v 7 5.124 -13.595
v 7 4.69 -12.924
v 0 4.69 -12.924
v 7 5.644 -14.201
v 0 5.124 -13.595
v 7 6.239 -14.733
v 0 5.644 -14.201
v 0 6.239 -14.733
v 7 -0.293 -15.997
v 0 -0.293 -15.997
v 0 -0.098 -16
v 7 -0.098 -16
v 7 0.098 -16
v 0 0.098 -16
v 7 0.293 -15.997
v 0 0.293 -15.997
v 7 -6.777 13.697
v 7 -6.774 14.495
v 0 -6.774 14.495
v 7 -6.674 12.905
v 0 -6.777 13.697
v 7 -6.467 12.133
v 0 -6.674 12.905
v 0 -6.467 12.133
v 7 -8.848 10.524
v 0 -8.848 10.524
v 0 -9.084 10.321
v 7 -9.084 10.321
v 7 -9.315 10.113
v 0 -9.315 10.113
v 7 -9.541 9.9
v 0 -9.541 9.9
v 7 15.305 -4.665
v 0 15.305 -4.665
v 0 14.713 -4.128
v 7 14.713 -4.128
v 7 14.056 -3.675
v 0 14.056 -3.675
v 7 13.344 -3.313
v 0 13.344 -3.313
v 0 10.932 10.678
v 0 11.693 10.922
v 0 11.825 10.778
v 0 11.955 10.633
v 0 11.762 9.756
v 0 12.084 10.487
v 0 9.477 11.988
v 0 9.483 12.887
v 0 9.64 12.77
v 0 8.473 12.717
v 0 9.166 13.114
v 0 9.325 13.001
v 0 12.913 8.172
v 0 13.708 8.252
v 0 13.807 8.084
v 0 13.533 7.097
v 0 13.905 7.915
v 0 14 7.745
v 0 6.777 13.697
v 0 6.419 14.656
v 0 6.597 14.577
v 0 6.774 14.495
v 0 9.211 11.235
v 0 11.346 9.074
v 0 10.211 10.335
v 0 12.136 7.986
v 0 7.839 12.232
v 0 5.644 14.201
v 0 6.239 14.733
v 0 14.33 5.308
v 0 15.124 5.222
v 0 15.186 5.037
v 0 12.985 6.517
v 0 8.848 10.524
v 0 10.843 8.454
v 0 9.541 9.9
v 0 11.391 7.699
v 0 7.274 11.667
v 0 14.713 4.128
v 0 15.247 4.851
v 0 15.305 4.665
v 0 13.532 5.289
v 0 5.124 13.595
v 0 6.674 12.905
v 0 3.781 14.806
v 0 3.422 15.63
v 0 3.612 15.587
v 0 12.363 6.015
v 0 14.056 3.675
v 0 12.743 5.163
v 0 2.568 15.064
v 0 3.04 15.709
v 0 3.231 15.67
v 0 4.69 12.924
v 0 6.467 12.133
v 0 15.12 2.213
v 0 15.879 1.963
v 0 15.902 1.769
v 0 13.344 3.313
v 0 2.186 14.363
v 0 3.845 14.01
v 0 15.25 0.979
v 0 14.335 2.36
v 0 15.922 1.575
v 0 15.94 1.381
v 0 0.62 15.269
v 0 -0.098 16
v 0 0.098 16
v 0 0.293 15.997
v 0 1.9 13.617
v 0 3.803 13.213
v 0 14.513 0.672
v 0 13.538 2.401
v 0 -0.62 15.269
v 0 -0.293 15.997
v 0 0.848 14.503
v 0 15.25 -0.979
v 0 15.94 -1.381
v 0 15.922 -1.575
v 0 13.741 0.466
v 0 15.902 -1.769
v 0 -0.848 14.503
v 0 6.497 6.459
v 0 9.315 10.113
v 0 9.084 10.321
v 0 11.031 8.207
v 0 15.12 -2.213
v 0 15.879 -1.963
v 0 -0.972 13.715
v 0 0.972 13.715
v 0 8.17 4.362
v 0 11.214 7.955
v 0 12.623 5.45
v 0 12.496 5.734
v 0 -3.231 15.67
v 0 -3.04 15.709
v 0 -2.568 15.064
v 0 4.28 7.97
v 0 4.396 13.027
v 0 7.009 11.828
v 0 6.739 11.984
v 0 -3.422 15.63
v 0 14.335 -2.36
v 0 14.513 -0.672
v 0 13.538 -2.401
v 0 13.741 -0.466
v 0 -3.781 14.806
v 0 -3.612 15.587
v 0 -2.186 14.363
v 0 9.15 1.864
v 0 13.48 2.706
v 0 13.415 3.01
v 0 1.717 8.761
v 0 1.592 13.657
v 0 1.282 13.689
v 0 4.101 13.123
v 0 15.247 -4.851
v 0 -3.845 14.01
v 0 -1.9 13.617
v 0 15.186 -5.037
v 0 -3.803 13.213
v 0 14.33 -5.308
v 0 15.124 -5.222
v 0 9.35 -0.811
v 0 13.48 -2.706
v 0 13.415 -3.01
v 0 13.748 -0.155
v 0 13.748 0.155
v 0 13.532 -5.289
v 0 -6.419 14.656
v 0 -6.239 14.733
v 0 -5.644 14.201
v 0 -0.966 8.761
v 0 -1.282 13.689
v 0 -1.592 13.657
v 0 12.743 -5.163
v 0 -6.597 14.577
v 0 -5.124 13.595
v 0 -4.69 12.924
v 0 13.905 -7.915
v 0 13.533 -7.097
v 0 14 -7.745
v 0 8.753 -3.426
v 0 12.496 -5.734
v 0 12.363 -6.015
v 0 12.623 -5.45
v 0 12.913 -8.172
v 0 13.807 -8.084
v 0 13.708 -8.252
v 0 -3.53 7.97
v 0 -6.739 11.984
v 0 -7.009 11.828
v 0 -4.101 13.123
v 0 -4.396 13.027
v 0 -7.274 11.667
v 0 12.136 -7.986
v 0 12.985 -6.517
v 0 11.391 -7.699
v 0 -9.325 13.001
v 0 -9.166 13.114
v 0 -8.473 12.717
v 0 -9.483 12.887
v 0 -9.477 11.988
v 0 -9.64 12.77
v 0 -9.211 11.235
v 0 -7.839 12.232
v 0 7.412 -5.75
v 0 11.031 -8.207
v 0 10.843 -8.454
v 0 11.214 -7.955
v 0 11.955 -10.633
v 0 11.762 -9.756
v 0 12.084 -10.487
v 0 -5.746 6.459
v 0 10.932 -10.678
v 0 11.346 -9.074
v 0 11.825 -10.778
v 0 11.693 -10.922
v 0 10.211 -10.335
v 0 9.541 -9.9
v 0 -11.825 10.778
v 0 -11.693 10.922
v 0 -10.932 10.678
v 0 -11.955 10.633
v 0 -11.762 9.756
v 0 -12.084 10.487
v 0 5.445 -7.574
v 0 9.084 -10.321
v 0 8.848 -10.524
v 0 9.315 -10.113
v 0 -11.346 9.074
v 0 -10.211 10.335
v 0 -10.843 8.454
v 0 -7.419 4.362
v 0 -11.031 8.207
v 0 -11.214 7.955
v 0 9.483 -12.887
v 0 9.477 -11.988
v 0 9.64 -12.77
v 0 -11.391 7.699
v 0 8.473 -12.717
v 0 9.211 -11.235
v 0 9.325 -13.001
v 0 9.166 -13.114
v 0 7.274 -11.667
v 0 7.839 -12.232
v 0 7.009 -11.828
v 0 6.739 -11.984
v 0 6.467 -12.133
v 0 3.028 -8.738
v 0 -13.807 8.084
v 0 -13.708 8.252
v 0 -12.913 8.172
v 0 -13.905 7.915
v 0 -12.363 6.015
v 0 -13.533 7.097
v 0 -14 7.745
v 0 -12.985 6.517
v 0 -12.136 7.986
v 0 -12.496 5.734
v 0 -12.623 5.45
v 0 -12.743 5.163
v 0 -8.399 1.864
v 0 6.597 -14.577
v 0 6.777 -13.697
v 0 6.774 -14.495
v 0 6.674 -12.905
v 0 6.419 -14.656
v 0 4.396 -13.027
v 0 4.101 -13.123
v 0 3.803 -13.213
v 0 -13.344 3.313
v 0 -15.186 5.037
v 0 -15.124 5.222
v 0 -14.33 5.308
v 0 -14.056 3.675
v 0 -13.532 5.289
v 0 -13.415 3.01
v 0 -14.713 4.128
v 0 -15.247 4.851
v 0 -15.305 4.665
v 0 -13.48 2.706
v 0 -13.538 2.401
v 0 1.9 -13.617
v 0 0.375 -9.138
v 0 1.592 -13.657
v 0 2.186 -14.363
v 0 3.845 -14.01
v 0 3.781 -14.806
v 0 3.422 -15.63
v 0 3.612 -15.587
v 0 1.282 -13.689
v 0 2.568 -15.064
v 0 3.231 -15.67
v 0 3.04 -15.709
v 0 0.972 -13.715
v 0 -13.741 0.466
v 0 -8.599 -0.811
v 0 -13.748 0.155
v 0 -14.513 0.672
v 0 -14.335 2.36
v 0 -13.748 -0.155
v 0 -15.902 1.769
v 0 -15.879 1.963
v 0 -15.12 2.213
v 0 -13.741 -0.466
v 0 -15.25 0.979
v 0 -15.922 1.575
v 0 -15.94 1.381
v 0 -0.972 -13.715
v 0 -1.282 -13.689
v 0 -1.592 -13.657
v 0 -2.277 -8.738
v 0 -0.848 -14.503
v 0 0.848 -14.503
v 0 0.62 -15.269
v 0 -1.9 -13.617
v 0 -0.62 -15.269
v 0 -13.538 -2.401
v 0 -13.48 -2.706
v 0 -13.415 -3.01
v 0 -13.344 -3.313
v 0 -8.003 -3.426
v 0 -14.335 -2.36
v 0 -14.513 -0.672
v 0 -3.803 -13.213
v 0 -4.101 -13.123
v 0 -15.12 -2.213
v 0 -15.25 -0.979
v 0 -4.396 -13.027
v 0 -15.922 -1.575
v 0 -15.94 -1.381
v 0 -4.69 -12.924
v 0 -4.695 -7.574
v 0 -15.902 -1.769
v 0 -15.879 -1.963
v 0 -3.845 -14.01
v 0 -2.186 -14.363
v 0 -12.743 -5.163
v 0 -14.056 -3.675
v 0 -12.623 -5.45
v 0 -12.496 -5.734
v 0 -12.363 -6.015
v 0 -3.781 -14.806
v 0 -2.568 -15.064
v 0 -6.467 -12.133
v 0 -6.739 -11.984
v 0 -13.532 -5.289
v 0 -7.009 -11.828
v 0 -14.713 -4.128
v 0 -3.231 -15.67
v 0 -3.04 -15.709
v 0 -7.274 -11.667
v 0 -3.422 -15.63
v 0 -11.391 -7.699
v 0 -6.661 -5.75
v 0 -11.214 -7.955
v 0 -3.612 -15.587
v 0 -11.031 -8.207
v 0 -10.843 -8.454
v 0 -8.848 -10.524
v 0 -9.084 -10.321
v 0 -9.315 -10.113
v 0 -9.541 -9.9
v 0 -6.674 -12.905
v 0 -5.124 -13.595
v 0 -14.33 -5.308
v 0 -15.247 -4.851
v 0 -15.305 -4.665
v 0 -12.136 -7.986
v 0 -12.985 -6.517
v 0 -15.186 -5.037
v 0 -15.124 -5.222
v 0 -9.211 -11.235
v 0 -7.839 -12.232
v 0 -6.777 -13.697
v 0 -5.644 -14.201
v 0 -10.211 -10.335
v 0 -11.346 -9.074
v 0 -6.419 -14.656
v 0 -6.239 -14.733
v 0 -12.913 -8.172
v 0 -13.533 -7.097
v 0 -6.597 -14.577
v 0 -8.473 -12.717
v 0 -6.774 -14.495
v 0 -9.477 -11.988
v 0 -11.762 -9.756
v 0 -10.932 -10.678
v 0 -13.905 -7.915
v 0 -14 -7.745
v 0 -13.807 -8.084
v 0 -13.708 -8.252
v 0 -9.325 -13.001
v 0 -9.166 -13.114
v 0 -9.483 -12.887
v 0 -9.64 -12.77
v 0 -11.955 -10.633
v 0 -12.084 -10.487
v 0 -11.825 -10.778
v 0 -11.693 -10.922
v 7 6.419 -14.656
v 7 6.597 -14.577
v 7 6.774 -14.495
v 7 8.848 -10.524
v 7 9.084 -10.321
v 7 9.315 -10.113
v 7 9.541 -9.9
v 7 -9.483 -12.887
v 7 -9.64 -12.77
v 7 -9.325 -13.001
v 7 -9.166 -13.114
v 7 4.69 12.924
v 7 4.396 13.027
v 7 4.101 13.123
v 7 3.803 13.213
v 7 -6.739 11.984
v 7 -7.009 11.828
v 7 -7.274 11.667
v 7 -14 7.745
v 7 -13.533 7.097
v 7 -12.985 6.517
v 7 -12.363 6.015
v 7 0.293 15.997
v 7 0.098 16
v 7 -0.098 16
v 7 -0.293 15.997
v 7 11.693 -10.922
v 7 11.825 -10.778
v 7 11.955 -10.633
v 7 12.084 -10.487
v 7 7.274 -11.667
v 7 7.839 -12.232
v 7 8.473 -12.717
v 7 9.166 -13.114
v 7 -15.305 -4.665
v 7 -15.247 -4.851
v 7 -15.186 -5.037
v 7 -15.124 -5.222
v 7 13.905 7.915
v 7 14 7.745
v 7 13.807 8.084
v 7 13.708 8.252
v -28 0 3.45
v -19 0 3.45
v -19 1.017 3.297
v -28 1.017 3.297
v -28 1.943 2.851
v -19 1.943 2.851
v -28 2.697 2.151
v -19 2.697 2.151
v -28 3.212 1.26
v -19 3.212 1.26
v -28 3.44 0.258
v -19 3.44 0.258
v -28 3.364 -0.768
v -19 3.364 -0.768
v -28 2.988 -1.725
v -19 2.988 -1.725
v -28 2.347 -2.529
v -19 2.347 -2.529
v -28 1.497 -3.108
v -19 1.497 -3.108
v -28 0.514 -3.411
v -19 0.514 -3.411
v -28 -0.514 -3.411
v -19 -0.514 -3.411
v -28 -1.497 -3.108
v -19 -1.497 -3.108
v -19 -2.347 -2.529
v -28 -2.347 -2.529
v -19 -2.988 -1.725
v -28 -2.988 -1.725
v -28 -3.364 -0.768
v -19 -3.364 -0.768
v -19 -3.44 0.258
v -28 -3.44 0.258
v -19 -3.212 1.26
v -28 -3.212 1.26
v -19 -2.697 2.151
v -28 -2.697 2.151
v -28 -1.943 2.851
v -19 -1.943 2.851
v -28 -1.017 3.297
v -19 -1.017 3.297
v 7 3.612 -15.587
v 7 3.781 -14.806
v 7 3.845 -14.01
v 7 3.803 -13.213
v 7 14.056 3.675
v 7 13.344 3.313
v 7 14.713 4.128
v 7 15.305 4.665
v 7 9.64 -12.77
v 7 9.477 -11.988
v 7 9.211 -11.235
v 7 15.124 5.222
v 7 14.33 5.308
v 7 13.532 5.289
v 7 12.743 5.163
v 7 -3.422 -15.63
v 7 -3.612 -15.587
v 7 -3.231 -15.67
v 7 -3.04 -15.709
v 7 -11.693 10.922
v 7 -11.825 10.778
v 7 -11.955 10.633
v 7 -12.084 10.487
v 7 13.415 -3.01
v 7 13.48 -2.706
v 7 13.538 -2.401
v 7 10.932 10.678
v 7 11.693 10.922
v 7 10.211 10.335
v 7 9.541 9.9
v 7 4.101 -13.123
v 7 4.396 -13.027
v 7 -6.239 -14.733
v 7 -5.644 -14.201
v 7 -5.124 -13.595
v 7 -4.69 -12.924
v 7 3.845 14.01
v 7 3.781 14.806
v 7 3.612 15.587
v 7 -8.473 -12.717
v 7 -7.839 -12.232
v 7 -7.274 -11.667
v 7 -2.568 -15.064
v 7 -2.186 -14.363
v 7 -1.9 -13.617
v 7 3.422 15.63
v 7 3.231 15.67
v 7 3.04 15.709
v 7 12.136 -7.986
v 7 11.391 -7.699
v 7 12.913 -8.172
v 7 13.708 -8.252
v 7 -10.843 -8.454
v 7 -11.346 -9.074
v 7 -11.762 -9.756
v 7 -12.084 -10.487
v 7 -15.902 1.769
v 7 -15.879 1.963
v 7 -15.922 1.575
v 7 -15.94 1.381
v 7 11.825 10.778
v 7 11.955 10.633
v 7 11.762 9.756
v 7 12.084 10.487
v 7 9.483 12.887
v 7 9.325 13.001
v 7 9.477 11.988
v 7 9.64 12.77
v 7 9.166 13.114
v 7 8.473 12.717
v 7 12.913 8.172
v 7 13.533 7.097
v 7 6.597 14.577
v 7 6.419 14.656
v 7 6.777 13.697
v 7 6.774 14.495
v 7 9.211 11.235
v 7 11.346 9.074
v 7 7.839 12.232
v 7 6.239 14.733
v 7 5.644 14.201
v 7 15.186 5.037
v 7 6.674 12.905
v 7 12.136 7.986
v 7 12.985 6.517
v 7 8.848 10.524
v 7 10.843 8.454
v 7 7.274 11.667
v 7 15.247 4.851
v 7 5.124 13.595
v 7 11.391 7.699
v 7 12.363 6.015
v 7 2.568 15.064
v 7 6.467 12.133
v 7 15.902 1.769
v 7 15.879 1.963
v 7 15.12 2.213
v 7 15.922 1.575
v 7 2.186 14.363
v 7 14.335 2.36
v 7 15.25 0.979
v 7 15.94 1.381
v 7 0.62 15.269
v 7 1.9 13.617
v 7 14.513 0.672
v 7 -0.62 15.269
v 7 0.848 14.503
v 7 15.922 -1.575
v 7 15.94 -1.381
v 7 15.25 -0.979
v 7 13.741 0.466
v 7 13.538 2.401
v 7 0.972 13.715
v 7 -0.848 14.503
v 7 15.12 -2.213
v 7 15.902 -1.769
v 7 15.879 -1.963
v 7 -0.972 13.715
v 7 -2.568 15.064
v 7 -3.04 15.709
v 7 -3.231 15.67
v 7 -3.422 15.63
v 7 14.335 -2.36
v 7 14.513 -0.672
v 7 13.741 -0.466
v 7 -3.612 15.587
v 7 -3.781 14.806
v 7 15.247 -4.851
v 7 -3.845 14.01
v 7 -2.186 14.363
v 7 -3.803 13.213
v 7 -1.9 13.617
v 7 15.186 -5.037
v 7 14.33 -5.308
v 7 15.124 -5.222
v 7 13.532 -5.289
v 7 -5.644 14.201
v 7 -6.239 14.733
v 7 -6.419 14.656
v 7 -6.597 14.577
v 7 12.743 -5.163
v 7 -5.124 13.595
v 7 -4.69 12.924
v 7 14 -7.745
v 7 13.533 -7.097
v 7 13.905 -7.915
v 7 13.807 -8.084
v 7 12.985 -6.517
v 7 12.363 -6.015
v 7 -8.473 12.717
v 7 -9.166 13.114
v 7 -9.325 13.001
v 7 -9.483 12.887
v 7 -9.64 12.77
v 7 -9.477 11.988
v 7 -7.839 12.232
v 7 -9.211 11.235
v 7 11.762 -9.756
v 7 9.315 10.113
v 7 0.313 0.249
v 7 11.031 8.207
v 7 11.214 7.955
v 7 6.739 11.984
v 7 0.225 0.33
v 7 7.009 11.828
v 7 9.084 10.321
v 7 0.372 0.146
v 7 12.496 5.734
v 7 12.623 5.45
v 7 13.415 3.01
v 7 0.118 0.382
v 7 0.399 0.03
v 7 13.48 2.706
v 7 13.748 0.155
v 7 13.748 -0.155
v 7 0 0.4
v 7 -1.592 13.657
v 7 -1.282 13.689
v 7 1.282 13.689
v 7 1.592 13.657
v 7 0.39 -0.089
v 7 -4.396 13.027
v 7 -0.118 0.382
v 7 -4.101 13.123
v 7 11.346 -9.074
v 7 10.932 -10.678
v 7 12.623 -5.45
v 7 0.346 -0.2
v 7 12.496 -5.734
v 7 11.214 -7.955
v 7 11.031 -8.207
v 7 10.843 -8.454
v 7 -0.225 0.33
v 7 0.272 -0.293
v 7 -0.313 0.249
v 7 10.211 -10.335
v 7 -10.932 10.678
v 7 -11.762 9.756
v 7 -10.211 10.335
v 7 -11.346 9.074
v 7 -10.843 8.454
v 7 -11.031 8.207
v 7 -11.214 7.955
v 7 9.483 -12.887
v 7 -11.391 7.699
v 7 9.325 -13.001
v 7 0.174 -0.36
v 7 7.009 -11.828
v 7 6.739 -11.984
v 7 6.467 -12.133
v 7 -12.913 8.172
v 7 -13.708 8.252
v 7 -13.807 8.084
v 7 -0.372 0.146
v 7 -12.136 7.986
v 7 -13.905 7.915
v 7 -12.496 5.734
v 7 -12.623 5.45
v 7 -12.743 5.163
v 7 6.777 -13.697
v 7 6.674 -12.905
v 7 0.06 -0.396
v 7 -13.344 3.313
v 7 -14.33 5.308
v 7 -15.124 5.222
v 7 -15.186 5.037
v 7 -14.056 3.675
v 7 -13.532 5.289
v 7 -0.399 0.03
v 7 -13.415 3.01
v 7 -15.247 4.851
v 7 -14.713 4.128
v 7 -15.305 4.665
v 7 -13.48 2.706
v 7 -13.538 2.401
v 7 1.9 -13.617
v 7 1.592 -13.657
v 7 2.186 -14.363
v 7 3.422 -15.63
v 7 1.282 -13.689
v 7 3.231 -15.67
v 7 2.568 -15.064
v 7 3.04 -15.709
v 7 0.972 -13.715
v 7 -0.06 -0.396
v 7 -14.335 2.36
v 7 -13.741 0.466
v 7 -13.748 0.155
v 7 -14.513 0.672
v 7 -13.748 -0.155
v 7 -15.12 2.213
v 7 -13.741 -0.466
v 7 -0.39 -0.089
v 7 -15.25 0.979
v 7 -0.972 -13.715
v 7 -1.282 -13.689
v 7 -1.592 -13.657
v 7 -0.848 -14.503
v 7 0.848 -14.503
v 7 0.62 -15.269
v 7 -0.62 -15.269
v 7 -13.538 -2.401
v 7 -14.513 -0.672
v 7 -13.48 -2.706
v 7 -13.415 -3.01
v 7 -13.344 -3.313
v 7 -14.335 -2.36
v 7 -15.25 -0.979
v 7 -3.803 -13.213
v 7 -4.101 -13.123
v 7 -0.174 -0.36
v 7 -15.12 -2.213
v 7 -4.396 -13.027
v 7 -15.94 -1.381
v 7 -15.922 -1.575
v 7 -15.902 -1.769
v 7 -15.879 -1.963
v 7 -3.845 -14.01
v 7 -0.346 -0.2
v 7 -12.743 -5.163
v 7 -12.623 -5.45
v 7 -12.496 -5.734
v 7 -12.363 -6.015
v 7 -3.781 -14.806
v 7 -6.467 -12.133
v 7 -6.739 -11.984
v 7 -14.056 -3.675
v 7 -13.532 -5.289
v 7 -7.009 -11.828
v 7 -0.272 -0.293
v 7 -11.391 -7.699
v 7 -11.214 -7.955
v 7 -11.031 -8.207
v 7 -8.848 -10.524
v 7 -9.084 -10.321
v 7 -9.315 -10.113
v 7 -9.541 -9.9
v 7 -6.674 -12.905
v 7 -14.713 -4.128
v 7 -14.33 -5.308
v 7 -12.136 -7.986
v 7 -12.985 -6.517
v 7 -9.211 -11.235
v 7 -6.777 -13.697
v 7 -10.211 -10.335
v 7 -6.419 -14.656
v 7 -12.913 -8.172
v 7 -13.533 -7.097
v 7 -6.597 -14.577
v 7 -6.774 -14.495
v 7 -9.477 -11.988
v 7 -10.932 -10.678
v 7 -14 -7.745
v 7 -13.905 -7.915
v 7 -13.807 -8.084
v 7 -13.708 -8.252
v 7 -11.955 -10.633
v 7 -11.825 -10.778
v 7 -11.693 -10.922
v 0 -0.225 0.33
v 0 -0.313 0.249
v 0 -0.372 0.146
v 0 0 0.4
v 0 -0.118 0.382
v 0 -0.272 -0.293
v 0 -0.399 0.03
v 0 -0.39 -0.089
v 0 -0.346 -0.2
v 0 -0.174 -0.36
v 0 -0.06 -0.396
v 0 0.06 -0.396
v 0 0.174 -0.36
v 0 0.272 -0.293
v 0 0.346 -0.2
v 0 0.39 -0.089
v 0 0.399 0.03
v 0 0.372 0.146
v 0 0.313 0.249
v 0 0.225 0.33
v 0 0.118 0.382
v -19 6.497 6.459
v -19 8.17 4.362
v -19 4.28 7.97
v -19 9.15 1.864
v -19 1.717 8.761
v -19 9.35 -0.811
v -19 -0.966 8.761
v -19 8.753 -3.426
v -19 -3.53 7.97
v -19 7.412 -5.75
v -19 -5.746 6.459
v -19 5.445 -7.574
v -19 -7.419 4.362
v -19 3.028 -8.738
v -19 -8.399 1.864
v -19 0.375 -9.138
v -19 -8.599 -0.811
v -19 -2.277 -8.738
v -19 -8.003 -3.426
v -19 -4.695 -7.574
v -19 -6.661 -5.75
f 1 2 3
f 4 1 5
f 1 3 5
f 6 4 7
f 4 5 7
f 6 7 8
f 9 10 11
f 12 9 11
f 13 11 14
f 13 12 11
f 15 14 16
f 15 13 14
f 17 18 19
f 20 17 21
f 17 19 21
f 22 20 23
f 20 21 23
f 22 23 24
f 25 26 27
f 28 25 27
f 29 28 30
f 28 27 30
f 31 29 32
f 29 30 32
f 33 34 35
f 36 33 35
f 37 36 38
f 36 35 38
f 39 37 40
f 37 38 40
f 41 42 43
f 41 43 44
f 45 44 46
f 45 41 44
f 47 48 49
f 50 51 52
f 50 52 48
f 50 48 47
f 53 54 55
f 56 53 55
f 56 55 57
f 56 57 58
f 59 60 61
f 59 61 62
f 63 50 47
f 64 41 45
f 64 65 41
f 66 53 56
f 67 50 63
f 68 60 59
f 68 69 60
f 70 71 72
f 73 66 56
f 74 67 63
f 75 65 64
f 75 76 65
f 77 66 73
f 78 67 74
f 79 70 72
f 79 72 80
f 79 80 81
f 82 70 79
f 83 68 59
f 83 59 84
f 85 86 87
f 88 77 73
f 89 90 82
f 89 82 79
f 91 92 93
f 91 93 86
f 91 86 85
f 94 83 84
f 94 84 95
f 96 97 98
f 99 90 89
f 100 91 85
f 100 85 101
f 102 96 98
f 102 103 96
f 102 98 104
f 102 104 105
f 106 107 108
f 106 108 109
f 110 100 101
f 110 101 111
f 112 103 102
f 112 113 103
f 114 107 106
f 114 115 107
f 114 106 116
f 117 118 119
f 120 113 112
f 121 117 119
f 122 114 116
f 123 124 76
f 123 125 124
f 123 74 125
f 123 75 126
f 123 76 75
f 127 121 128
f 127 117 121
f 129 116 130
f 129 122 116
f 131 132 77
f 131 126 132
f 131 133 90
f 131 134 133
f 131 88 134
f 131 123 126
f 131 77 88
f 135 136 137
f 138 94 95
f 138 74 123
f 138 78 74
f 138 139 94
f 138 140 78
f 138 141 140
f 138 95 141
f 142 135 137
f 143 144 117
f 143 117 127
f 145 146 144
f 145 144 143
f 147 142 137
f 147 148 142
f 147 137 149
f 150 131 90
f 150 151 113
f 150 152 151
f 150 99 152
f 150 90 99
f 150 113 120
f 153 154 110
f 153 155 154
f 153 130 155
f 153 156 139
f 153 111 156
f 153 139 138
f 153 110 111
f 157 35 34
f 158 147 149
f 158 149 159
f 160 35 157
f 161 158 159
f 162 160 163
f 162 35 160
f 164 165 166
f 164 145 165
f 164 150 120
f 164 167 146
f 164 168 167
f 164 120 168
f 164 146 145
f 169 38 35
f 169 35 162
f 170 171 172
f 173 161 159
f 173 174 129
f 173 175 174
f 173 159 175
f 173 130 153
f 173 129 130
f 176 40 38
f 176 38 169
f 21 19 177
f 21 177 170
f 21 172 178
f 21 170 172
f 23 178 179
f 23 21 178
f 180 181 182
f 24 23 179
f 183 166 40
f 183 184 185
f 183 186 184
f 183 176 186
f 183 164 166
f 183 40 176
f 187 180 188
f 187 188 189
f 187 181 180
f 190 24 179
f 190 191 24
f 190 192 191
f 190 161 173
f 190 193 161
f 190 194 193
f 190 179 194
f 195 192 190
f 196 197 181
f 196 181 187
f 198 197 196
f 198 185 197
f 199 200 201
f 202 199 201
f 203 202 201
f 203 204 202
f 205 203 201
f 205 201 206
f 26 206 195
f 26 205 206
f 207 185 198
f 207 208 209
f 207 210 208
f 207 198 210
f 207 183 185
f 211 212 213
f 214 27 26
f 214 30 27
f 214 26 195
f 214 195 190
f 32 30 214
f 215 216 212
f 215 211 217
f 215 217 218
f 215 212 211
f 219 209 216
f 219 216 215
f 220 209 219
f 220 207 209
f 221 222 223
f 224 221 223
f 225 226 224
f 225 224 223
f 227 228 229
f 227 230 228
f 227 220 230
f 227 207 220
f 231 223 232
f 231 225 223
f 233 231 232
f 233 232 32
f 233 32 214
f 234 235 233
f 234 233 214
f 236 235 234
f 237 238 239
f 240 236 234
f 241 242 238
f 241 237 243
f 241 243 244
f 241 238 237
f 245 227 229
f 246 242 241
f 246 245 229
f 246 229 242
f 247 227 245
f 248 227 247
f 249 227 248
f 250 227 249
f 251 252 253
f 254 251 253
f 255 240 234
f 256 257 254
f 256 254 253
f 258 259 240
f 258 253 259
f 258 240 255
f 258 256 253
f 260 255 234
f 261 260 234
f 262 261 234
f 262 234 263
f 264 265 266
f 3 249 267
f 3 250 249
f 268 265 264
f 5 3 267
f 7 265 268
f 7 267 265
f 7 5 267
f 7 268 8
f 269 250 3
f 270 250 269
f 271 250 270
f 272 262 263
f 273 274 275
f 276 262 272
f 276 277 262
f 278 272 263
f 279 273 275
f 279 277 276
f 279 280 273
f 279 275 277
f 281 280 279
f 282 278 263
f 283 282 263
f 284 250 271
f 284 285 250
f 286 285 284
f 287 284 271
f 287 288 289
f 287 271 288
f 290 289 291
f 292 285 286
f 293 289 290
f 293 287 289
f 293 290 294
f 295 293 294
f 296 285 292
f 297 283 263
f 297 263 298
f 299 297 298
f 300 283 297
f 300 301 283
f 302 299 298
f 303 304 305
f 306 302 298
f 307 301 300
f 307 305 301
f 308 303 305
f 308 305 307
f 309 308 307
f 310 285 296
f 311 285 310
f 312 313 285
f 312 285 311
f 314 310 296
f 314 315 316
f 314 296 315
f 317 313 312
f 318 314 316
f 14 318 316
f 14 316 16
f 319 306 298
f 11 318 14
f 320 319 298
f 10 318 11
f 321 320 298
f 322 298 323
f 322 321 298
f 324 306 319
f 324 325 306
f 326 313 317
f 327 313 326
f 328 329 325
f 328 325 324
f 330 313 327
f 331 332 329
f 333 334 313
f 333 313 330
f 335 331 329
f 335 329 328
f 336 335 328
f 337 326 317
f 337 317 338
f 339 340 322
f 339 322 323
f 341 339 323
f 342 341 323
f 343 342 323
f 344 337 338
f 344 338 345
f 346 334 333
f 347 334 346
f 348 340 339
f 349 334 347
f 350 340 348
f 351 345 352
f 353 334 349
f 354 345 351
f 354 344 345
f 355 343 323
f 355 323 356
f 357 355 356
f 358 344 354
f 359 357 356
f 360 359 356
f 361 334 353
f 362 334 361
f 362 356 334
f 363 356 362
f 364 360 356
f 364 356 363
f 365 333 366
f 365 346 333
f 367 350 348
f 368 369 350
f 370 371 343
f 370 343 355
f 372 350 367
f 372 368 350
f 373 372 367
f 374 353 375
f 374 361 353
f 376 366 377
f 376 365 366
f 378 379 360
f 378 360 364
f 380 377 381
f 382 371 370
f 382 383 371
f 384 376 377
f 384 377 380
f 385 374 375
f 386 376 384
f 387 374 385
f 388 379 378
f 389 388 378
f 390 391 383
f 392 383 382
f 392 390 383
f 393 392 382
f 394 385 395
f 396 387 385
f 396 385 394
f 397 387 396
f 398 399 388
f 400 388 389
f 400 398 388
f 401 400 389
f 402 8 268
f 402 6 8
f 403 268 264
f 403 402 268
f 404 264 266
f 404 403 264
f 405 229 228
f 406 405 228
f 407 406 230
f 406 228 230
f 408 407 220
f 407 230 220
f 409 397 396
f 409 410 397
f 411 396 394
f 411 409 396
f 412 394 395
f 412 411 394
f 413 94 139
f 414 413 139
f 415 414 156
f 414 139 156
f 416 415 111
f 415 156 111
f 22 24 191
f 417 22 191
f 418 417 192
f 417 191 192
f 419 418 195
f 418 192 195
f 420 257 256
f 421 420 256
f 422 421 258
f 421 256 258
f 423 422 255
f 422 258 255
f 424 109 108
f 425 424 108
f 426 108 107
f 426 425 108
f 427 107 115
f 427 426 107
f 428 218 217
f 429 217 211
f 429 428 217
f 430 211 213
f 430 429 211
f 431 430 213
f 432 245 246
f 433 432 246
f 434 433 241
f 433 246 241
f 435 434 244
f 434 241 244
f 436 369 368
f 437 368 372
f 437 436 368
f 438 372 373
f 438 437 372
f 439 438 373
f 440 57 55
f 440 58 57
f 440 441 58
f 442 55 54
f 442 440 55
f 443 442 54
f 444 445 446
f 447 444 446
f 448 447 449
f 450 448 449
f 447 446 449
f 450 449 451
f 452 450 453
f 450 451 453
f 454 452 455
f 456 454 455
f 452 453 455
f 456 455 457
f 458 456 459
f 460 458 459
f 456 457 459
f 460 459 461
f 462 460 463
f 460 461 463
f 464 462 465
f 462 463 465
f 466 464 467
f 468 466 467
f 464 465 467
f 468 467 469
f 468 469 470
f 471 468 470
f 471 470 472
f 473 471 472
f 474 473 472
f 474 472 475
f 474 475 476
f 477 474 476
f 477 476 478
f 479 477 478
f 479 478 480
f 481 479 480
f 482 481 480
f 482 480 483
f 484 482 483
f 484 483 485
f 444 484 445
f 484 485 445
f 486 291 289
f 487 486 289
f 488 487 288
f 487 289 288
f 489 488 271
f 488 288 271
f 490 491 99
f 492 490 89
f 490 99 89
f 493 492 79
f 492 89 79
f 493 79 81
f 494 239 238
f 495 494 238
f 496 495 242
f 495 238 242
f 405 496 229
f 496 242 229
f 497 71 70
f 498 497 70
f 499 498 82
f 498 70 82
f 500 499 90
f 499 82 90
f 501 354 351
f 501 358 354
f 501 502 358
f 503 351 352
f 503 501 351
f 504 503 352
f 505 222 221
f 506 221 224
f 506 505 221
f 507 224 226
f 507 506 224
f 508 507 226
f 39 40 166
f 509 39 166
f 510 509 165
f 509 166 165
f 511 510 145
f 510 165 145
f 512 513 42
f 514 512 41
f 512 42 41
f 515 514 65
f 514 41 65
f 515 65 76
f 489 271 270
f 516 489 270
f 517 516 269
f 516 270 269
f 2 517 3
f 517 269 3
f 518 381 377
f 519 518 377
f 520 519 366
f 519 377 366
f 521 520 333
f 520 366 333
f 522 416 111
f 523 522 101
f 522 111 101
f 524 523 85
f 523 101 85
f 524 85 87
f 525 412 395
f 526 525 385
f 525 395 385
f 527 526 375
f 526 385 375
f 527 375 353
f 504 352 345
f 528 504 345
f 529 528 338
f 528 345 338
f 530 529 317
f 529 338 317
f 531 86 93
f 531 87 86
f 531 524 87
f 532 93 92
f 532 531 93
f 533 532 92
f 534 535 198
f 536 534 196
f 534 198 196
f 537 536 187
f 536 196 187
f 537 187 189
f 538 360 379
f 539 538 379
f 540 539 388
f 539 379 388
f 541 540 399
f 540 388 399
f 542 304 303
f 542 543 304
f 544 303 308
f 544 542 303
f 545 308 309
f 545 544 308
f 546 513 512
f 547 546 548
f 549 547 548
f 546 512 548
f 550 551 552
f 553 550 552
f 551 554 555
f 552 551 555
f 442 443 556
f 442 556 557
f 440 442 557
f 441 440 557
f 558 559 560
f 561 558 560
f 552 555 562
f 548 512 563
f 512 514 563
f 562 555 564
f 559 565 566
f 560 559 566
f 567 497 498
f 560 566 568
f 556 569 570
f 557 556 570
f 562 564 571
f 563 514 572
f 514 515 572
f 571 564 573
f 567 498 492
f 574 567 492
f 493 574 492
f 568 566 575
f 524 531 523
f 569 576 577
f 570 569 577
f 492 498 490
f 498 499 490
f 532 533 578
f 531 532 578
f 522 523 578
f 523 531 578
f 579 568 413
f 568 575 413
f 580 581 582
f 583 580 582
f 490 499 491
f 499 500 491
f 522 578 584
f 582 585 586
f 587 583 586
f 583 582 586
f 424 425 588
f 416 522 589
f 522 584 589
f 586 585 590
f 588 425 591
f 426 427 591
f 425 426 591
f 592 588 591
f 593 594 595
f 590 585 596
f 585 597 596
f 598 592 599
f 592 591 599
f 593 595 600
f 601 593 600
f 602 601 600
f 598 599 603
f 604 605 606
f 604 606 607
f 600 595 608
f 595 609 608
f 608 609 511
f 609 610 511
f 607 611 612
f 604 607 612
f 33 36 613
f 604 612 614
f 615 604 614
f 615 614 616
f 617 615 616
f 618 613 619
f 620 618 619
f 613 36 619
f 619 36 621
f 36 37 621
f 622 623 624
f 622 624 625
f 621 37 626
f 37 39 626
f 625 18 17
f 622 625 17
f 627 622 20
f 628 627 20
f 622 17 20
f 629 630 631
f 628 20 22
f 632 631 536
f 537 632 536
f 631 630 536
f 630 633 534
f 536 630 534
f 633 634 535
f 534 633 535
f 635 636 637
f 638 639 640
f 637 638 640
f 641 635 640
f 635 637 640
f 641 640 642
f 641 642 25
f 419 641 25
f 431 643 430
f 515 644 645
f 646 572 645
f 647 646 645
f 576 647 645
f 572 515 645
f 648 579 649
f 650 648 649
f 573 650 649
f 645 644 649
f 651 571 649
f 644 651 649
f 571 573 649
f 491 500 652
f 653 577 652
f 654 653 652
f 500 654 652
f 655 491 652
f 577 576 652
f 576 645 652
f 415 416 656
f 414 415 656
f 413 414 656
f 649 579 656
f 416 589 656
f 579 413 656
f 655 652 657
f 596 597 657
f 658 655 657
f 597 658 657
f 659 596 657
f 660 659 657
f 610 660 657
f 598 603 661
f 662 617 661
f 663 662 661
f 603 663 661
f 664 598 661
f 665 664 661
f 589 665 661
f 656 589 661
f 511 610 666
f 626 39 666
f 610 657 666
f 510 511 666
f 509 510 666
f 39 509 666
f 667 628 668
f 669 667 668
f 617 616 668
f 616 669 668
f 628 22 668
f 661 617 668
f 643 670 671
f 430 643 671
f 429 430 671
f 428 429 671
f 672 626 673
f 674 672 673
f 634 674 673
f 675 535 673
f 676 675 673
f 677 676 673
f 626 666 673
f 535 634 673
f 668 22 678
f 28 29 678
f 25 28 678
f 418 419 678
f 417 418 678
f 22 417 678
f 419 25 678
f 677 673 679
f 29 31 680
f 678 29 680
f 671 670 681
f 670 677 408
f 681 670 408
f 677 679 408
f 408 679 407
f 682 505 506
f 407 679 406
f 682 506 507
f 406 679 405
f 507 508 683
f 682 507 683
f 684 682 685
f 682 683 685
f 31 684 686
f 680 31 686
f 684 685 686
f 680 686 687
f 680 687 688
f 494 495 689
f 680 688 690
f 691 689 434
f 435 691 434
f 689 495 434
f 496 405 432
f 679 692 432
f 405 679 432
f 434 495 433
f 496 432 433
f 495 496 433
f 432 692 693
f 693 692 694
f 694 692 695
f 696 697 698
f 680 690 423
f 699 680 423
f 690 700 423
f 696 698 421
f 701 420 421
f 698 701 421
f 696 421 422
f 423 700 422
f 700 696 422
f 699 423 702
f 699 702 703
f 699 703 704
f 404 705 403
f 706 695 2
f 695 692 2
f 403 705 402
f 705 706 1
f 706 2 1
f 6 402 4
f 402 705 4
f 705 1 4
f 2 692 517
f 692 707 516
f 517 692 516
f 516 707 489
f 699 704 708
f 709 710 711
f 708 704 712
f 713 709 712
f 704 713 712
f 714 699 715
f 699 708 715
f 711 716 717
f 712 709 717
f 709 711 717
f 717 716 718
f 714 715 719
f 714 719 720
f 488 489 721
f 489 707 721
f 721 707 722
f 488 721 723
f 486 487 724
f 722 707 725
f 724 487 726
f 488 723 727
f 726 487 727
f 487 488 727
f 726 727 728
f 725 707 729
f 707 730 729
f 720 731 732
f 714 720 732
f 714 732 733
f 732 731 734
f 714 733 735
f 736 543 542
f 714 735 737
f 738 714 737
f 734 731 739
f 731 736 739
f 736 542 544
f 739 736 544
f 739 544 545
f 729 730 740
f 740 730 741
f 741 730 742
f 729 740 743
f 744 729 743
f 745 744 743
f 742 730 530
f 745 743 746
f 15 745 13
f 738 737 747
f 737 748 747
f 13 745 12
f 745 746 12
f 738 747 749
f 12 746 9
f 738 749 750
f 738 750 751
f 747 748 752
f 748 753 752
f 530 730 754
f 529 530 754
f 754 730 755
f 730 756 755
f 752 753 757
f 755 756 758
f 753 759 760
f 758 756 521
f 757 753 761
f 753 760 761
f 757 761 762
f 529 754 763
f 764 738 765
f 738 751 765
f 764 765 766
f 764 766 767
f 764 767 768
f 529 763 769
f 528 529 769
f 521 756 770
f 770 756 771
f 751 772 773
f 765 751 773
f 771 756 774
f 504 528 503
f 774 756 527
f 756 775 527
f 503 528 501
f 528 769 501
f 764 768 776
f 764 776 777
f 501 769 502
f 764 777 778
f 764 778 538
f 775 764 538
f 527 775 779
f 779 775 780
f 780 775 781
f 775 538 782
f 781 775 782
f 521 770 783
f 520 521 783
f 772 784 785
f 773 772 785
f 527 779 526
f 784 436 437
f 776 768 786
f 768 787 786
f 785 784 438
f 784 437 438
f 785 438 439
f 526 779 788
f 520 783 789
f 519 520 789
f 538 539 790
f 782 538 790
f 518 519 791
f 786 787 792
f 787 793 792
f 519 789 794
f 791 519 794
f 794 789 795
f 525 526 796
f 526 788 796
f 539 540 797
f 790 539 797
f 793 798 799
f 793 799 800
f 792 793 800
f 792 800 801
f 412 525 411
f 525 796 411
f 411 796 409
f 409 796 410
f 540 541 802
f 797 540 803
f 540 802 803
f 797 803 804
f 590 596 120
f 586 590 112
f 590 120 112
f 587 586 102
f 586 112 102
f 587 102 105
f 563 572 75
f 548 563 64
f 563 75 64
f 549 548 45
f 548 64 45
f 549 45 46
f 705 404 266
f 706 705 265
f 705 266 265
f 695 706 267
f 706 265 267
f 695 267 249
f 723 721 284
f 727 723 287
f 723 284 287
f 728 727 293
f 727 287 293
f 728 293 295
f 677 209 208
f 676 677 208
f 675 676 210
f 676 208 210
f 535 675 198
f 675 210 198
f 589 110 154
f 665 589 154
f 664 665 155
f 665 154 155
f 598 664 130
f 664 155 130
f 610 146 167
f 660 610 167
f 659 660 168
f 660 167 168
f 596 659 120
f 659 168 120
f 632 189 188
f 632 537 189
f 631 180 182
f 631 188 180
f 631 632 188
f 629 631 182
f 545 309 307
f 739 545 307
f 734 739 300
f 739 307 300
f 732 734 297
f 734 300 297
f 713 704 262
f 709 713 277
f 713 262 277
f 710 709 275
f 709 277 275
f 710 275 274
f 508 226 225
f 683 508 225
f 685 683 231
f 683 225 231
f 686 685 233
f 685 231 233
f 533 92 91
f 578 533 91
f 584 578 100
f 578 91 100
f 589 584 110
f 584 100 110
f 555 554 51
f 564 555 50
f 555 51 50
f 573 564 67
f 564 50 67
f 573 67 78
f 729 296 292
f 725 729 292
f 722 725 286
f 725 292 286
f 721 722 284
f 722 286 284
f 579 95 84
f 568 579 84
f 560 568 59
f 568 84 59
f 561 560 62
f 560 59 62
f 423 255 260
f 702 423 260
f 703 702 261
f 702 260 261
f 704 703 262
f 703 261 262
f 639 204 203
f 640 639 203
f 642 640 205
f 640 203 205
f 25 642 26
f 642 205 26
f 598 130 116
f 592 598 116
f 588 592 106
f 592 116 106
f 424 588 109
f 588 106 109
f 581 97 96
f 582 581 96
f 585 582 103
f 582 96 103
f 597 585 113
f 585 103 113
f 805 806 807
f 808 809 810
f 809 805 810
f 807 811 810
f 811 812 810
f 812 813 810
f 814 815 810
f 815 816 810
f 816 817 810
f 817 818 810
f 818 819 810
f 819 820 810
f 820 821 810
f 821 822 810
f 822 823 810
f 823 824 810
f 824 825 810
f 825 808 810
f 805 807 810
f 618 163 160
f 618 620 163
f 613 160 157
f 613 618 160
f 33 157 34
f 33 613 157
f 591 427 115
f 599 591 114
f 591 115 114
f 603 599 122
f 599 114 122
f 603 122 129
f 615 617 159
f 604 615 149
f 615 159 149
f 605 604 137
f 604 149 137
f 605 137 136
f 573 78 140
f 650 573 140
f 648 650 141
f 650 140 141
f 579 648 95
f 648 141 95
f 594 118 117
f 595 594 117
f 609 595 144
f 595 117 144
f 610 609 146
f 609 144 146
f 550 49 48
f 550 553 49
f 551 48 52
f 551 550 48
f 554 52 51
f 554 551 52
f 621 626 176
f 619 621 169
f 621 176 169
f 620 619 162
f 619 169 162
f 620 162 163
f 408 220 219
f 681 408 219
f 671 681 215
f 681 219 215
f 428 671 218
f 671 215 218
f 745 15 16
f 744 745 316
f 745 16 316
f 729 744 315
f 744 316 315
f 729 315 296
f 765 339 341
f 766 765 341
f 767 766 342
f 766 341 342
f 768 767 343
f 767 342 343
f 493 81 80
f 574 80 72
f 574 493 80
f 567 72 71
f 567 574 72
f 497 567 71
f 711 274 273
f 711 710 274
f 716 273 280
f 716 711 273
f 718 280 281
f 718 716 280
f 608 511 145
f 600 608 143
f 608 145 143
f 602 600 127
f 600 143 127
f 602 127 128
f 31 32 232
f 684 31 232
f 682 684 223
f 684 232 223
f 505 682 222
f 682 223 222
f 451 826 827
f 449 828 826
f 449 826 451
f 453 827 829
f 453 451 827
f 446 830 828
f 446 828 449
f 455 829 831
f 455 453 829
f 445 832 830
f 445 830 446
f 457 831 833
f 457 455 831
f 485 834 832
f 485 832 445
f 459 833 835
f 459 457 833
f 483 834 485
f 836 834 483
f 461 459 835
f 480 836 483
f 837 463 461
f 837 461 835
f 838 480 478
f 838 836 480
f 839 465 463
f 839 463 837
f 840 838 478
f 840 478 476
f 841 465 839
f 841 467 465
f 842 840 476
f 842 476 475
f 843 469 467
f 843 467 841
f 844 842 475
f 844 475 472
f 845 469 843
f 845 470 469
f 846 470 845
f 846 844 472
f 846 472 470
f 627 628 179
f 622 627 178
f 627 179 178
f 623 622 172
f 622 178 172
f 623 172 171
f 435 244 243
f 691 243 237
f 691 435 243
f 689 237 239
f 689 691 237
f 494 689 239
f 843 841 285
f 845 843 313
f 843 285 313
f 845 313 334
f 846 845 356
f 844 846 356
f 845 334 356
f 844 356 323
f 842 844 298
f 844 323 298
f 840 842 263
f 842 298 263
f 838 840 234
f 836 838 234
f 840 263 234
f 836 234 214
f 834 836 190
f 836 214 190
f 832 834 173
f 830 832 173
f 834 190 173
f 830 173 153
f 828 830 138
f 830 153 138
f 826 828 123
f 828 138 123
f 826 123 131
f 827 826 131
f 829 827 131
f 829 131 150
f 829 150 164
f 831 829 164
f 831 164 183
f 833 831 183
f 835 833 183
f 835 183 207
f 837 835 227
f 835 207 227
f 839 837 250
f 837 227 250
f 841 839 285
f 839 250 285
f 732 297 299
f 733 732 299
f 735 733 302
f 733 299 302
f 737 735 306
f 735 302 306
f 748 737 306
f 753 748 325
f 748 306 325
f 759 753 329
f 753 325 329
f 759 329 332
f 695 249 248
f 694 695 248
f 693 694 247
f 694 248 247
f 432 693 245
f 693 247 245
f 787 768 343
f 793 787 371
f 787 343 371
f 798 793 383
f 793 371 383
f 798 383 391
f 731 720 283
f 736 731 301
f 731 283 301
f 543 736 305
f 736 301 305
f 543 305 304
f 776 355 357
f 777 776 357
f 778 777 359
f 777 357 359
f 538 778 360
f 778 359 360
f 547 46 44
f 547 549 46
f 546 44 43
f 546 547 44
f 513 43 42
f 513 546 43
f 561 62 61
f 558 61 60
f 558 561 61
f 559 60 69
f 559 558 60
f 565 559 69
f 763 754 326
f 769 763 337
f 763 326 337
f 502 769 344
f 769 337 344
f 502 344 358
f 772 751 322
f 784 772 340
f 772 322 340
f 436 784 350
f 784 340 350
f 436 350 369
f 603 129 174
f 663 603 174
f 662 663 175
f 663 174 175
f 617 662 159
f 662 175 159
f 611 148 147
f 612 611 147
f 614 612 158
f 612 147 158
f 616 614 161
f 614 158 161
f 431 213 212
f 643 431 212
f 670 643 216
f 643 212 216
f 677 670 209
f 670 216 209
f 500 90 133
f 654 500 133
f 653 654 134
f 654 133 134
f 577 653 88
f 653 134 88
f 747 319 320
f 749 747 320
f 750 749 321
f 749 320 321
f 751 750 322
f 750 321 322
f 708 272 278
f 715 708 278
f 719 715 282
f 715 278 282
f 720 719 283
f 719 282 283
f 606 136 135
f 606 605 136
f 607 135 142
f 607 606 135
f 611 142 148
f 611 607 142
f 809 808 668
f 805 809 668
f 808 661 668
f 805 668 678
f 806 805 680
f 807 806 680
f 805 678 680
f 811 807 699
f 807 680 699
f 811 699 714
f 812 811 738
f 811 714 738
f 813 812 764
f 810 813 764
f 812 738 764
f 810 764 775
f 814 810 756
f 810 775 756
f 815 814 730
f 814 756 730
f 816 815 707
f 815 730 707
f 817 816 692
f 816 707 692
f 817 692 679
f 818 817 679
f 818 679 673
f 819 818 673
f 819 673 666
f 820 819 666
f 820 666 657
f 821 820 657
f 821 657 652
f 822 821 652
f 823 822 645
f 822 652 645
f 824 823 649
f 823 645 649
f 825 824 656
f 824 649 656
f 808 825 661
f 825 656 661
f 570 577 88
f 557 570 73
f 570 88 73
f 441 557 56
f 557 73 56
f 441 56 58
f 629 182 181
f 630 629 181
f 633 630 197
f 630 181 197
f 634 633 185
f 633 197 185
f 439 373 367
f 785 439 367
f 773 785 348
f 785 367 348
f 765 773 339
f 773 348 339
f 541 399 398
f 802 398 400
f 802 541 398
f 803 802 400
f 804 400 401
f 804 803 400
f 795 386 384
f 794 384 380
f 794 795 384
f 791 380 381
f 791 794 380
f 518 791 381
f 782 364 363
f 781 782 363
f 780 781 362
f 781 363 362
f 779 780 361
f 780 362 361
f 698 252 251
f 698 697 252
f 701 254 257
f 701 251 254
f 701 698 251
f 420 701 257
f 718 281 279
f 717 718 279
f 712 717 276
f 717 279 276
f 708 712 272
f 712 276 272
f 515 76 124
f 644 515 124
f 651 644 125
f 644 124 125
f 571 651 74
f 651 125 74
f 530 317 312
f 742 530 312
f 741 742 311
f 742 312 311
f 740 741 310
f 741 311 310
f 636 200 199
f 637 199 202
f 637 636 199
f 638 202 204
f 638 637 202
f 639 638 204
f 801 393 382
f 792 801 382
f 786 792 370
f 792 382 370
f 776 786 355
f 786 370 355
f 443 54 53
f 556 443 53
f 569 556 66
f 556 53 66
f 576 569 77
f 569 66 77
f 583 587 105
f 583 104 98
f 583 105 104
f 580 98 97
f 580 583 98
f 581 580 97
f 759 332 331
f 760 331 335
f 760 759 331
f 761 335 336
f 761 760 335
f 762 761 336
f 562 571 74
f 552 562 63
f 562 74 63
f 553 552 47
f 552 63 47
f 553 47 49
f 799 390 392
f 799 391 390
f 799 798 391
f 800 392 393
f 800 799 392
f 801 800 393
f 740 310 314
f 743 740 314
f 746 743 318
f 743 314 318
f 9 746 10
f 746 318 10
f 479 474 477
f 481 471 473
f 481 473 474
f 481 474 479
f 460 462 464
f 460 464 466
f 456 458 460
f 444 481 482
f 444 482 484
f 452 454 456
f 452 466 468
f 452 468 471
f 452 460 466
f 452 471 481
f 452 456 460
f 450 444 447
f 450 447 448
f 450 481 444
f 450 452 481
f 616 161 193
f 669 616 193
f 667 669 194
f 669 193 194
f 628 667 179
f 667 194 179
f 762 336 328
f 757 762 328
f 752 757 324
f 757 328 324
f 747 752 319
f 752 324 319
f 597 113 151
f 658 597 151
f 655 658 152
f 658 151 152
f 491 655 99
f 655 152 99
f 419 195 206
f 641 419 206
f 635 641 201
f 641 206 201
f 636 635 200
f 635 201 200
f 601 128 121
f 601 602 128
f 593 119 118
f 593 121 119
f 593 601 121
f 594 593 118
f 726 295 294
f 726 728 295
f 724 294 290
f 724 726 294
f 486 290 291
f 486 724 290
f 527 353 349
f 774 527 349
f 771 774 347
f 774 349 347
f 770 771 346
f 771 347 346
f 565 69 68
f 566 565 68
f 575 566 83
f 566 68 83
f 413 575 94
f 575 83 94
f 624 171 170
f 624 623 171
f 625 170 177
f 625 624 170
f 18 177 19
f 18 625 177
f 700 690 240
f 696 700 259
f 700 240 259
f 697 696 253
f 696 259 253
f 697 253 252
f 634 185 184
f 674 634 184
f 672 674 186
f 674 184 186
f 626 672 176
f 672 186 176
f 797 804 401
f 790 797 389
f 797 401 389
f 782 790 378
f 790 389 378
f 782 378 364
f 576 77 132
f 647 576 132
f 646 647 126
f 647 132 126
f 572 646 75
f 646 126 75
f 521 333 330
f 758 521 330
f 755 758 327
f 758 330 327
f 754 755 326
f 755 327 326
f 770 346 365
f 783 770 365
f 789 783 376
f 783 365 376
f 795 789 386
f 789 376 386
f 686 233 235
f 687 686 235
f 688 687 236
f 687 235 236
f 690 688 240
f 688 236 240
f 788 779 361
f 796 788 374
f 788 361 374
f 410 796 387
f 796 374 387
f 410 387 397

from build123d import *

# Parameters (mm, degrees)
BASPROSKE_W         = 7
BASPROSKE_H         = 16
TOOTHCUT_DEPTH      = 24.685438565
TEETHCUTS_COUNT     = 30
TEETHCUTS_ANGLE     = 348
BORSKE_R            = 0.4
BORE_DEPTH          = 50.0000508
SKETCH1_R           = 9
BOSS_EXTRUDE1_DEPTH = 19
SKETCH2_R           = 3.45
BOSS_EXTRUDE2_DEPTH = 9


with BuildPart() as part:
    # BasProSke → Base-Revolve (revolve)
    with BuildSketch(Plane(origin=(0, 0, 0), x_dir=(1, 0, 0), z_dir=(0, 1, 0)), mode=Mode.PRIVATE) as base_revolve_sk:
        with Locations((3.5, 8)):
            Rectangle(BASPROSKE_W, BASPROSKE_H)
    revolve(base_revolve_sk.sketch.rotate(Axis((-10, 0, 0), (1, 0, 0)), 180), axis=Axis((-10, 0, 0), (1, 0, 0)))

    # TooCutSke → ToothCut (cut, through all)
    with BuildSketch(Plane(origin=(0, 0, 0), x_dir=(0, 0, -1), z_dir=(1, 0, 0))):
        with BuildLine():
            ThreePointArc((0.466400716, 13.741086979), (0, 13.749), (-0.466400716, 13.741086979))
            ThreePointArc((-0.466400716, 13.741086979), (-0.819142092, 14.899954875), (-1.3974676, 15.964351834))
            ThreePointArc((-1.3974676, 15.964351834), (0, 16.0254), (1.3974676, 15.964351834))
            ThreePointArc((1.3974676, 15.964351834), (0.819142092, 14.899954875), (0.466400716, 13.741086979))
        make_face()
    toothcut = extrude(amount=TOOTHCUT_DEPTH, mode=Mode.SUBTRACT)

    # TeethCuts: ToothCut ×30 about axis
    teethcuts_axis = Axis((-10, 0, 0), (1, 0, 0))
    for i in range(1, TEETHCUTS_COUNT):
        add(toothcut.rotate(teethcuts_axis, i * TEETHCUTS_ANGLE / (TEETHCUTS_COUNT - 1)), mode=Mode.SUBTRACT)

    # BorSke → Bore (cut, symmetric)
    with BuildSketch(Plane(origin=(0, 0, 0), x_dir=(0, 0, -1), z_dir=(1, 0, 0))):
        with Locations(Location((0, 0, 0), (0, 0, 180))):
            Circle(BORSKE_R)
    extrude(amount=BORE_DEPTH, both=True, mode=Mode.SUBTRACT)

    # Sketch1 → Boss-Extrude1 (add)
    with BuildSketch(Plane.ZY):
        with Locations(Location((-0.138271535, 0.375341155, 0), (0, 0, 180))):
            Circle(SKETCH1_R)
    extrude(amount=BOSS_EXTRUDE1_DEPTH)

    # Sketch2 → Boss-Extrude2 (add)
    with BuildSketch(Plane.ZY.offset(19)):
        Circle(SKETCH2_R)
    extrude(amount=BOSS_EXTRUDE2_DEPTH)


solid = part.part
